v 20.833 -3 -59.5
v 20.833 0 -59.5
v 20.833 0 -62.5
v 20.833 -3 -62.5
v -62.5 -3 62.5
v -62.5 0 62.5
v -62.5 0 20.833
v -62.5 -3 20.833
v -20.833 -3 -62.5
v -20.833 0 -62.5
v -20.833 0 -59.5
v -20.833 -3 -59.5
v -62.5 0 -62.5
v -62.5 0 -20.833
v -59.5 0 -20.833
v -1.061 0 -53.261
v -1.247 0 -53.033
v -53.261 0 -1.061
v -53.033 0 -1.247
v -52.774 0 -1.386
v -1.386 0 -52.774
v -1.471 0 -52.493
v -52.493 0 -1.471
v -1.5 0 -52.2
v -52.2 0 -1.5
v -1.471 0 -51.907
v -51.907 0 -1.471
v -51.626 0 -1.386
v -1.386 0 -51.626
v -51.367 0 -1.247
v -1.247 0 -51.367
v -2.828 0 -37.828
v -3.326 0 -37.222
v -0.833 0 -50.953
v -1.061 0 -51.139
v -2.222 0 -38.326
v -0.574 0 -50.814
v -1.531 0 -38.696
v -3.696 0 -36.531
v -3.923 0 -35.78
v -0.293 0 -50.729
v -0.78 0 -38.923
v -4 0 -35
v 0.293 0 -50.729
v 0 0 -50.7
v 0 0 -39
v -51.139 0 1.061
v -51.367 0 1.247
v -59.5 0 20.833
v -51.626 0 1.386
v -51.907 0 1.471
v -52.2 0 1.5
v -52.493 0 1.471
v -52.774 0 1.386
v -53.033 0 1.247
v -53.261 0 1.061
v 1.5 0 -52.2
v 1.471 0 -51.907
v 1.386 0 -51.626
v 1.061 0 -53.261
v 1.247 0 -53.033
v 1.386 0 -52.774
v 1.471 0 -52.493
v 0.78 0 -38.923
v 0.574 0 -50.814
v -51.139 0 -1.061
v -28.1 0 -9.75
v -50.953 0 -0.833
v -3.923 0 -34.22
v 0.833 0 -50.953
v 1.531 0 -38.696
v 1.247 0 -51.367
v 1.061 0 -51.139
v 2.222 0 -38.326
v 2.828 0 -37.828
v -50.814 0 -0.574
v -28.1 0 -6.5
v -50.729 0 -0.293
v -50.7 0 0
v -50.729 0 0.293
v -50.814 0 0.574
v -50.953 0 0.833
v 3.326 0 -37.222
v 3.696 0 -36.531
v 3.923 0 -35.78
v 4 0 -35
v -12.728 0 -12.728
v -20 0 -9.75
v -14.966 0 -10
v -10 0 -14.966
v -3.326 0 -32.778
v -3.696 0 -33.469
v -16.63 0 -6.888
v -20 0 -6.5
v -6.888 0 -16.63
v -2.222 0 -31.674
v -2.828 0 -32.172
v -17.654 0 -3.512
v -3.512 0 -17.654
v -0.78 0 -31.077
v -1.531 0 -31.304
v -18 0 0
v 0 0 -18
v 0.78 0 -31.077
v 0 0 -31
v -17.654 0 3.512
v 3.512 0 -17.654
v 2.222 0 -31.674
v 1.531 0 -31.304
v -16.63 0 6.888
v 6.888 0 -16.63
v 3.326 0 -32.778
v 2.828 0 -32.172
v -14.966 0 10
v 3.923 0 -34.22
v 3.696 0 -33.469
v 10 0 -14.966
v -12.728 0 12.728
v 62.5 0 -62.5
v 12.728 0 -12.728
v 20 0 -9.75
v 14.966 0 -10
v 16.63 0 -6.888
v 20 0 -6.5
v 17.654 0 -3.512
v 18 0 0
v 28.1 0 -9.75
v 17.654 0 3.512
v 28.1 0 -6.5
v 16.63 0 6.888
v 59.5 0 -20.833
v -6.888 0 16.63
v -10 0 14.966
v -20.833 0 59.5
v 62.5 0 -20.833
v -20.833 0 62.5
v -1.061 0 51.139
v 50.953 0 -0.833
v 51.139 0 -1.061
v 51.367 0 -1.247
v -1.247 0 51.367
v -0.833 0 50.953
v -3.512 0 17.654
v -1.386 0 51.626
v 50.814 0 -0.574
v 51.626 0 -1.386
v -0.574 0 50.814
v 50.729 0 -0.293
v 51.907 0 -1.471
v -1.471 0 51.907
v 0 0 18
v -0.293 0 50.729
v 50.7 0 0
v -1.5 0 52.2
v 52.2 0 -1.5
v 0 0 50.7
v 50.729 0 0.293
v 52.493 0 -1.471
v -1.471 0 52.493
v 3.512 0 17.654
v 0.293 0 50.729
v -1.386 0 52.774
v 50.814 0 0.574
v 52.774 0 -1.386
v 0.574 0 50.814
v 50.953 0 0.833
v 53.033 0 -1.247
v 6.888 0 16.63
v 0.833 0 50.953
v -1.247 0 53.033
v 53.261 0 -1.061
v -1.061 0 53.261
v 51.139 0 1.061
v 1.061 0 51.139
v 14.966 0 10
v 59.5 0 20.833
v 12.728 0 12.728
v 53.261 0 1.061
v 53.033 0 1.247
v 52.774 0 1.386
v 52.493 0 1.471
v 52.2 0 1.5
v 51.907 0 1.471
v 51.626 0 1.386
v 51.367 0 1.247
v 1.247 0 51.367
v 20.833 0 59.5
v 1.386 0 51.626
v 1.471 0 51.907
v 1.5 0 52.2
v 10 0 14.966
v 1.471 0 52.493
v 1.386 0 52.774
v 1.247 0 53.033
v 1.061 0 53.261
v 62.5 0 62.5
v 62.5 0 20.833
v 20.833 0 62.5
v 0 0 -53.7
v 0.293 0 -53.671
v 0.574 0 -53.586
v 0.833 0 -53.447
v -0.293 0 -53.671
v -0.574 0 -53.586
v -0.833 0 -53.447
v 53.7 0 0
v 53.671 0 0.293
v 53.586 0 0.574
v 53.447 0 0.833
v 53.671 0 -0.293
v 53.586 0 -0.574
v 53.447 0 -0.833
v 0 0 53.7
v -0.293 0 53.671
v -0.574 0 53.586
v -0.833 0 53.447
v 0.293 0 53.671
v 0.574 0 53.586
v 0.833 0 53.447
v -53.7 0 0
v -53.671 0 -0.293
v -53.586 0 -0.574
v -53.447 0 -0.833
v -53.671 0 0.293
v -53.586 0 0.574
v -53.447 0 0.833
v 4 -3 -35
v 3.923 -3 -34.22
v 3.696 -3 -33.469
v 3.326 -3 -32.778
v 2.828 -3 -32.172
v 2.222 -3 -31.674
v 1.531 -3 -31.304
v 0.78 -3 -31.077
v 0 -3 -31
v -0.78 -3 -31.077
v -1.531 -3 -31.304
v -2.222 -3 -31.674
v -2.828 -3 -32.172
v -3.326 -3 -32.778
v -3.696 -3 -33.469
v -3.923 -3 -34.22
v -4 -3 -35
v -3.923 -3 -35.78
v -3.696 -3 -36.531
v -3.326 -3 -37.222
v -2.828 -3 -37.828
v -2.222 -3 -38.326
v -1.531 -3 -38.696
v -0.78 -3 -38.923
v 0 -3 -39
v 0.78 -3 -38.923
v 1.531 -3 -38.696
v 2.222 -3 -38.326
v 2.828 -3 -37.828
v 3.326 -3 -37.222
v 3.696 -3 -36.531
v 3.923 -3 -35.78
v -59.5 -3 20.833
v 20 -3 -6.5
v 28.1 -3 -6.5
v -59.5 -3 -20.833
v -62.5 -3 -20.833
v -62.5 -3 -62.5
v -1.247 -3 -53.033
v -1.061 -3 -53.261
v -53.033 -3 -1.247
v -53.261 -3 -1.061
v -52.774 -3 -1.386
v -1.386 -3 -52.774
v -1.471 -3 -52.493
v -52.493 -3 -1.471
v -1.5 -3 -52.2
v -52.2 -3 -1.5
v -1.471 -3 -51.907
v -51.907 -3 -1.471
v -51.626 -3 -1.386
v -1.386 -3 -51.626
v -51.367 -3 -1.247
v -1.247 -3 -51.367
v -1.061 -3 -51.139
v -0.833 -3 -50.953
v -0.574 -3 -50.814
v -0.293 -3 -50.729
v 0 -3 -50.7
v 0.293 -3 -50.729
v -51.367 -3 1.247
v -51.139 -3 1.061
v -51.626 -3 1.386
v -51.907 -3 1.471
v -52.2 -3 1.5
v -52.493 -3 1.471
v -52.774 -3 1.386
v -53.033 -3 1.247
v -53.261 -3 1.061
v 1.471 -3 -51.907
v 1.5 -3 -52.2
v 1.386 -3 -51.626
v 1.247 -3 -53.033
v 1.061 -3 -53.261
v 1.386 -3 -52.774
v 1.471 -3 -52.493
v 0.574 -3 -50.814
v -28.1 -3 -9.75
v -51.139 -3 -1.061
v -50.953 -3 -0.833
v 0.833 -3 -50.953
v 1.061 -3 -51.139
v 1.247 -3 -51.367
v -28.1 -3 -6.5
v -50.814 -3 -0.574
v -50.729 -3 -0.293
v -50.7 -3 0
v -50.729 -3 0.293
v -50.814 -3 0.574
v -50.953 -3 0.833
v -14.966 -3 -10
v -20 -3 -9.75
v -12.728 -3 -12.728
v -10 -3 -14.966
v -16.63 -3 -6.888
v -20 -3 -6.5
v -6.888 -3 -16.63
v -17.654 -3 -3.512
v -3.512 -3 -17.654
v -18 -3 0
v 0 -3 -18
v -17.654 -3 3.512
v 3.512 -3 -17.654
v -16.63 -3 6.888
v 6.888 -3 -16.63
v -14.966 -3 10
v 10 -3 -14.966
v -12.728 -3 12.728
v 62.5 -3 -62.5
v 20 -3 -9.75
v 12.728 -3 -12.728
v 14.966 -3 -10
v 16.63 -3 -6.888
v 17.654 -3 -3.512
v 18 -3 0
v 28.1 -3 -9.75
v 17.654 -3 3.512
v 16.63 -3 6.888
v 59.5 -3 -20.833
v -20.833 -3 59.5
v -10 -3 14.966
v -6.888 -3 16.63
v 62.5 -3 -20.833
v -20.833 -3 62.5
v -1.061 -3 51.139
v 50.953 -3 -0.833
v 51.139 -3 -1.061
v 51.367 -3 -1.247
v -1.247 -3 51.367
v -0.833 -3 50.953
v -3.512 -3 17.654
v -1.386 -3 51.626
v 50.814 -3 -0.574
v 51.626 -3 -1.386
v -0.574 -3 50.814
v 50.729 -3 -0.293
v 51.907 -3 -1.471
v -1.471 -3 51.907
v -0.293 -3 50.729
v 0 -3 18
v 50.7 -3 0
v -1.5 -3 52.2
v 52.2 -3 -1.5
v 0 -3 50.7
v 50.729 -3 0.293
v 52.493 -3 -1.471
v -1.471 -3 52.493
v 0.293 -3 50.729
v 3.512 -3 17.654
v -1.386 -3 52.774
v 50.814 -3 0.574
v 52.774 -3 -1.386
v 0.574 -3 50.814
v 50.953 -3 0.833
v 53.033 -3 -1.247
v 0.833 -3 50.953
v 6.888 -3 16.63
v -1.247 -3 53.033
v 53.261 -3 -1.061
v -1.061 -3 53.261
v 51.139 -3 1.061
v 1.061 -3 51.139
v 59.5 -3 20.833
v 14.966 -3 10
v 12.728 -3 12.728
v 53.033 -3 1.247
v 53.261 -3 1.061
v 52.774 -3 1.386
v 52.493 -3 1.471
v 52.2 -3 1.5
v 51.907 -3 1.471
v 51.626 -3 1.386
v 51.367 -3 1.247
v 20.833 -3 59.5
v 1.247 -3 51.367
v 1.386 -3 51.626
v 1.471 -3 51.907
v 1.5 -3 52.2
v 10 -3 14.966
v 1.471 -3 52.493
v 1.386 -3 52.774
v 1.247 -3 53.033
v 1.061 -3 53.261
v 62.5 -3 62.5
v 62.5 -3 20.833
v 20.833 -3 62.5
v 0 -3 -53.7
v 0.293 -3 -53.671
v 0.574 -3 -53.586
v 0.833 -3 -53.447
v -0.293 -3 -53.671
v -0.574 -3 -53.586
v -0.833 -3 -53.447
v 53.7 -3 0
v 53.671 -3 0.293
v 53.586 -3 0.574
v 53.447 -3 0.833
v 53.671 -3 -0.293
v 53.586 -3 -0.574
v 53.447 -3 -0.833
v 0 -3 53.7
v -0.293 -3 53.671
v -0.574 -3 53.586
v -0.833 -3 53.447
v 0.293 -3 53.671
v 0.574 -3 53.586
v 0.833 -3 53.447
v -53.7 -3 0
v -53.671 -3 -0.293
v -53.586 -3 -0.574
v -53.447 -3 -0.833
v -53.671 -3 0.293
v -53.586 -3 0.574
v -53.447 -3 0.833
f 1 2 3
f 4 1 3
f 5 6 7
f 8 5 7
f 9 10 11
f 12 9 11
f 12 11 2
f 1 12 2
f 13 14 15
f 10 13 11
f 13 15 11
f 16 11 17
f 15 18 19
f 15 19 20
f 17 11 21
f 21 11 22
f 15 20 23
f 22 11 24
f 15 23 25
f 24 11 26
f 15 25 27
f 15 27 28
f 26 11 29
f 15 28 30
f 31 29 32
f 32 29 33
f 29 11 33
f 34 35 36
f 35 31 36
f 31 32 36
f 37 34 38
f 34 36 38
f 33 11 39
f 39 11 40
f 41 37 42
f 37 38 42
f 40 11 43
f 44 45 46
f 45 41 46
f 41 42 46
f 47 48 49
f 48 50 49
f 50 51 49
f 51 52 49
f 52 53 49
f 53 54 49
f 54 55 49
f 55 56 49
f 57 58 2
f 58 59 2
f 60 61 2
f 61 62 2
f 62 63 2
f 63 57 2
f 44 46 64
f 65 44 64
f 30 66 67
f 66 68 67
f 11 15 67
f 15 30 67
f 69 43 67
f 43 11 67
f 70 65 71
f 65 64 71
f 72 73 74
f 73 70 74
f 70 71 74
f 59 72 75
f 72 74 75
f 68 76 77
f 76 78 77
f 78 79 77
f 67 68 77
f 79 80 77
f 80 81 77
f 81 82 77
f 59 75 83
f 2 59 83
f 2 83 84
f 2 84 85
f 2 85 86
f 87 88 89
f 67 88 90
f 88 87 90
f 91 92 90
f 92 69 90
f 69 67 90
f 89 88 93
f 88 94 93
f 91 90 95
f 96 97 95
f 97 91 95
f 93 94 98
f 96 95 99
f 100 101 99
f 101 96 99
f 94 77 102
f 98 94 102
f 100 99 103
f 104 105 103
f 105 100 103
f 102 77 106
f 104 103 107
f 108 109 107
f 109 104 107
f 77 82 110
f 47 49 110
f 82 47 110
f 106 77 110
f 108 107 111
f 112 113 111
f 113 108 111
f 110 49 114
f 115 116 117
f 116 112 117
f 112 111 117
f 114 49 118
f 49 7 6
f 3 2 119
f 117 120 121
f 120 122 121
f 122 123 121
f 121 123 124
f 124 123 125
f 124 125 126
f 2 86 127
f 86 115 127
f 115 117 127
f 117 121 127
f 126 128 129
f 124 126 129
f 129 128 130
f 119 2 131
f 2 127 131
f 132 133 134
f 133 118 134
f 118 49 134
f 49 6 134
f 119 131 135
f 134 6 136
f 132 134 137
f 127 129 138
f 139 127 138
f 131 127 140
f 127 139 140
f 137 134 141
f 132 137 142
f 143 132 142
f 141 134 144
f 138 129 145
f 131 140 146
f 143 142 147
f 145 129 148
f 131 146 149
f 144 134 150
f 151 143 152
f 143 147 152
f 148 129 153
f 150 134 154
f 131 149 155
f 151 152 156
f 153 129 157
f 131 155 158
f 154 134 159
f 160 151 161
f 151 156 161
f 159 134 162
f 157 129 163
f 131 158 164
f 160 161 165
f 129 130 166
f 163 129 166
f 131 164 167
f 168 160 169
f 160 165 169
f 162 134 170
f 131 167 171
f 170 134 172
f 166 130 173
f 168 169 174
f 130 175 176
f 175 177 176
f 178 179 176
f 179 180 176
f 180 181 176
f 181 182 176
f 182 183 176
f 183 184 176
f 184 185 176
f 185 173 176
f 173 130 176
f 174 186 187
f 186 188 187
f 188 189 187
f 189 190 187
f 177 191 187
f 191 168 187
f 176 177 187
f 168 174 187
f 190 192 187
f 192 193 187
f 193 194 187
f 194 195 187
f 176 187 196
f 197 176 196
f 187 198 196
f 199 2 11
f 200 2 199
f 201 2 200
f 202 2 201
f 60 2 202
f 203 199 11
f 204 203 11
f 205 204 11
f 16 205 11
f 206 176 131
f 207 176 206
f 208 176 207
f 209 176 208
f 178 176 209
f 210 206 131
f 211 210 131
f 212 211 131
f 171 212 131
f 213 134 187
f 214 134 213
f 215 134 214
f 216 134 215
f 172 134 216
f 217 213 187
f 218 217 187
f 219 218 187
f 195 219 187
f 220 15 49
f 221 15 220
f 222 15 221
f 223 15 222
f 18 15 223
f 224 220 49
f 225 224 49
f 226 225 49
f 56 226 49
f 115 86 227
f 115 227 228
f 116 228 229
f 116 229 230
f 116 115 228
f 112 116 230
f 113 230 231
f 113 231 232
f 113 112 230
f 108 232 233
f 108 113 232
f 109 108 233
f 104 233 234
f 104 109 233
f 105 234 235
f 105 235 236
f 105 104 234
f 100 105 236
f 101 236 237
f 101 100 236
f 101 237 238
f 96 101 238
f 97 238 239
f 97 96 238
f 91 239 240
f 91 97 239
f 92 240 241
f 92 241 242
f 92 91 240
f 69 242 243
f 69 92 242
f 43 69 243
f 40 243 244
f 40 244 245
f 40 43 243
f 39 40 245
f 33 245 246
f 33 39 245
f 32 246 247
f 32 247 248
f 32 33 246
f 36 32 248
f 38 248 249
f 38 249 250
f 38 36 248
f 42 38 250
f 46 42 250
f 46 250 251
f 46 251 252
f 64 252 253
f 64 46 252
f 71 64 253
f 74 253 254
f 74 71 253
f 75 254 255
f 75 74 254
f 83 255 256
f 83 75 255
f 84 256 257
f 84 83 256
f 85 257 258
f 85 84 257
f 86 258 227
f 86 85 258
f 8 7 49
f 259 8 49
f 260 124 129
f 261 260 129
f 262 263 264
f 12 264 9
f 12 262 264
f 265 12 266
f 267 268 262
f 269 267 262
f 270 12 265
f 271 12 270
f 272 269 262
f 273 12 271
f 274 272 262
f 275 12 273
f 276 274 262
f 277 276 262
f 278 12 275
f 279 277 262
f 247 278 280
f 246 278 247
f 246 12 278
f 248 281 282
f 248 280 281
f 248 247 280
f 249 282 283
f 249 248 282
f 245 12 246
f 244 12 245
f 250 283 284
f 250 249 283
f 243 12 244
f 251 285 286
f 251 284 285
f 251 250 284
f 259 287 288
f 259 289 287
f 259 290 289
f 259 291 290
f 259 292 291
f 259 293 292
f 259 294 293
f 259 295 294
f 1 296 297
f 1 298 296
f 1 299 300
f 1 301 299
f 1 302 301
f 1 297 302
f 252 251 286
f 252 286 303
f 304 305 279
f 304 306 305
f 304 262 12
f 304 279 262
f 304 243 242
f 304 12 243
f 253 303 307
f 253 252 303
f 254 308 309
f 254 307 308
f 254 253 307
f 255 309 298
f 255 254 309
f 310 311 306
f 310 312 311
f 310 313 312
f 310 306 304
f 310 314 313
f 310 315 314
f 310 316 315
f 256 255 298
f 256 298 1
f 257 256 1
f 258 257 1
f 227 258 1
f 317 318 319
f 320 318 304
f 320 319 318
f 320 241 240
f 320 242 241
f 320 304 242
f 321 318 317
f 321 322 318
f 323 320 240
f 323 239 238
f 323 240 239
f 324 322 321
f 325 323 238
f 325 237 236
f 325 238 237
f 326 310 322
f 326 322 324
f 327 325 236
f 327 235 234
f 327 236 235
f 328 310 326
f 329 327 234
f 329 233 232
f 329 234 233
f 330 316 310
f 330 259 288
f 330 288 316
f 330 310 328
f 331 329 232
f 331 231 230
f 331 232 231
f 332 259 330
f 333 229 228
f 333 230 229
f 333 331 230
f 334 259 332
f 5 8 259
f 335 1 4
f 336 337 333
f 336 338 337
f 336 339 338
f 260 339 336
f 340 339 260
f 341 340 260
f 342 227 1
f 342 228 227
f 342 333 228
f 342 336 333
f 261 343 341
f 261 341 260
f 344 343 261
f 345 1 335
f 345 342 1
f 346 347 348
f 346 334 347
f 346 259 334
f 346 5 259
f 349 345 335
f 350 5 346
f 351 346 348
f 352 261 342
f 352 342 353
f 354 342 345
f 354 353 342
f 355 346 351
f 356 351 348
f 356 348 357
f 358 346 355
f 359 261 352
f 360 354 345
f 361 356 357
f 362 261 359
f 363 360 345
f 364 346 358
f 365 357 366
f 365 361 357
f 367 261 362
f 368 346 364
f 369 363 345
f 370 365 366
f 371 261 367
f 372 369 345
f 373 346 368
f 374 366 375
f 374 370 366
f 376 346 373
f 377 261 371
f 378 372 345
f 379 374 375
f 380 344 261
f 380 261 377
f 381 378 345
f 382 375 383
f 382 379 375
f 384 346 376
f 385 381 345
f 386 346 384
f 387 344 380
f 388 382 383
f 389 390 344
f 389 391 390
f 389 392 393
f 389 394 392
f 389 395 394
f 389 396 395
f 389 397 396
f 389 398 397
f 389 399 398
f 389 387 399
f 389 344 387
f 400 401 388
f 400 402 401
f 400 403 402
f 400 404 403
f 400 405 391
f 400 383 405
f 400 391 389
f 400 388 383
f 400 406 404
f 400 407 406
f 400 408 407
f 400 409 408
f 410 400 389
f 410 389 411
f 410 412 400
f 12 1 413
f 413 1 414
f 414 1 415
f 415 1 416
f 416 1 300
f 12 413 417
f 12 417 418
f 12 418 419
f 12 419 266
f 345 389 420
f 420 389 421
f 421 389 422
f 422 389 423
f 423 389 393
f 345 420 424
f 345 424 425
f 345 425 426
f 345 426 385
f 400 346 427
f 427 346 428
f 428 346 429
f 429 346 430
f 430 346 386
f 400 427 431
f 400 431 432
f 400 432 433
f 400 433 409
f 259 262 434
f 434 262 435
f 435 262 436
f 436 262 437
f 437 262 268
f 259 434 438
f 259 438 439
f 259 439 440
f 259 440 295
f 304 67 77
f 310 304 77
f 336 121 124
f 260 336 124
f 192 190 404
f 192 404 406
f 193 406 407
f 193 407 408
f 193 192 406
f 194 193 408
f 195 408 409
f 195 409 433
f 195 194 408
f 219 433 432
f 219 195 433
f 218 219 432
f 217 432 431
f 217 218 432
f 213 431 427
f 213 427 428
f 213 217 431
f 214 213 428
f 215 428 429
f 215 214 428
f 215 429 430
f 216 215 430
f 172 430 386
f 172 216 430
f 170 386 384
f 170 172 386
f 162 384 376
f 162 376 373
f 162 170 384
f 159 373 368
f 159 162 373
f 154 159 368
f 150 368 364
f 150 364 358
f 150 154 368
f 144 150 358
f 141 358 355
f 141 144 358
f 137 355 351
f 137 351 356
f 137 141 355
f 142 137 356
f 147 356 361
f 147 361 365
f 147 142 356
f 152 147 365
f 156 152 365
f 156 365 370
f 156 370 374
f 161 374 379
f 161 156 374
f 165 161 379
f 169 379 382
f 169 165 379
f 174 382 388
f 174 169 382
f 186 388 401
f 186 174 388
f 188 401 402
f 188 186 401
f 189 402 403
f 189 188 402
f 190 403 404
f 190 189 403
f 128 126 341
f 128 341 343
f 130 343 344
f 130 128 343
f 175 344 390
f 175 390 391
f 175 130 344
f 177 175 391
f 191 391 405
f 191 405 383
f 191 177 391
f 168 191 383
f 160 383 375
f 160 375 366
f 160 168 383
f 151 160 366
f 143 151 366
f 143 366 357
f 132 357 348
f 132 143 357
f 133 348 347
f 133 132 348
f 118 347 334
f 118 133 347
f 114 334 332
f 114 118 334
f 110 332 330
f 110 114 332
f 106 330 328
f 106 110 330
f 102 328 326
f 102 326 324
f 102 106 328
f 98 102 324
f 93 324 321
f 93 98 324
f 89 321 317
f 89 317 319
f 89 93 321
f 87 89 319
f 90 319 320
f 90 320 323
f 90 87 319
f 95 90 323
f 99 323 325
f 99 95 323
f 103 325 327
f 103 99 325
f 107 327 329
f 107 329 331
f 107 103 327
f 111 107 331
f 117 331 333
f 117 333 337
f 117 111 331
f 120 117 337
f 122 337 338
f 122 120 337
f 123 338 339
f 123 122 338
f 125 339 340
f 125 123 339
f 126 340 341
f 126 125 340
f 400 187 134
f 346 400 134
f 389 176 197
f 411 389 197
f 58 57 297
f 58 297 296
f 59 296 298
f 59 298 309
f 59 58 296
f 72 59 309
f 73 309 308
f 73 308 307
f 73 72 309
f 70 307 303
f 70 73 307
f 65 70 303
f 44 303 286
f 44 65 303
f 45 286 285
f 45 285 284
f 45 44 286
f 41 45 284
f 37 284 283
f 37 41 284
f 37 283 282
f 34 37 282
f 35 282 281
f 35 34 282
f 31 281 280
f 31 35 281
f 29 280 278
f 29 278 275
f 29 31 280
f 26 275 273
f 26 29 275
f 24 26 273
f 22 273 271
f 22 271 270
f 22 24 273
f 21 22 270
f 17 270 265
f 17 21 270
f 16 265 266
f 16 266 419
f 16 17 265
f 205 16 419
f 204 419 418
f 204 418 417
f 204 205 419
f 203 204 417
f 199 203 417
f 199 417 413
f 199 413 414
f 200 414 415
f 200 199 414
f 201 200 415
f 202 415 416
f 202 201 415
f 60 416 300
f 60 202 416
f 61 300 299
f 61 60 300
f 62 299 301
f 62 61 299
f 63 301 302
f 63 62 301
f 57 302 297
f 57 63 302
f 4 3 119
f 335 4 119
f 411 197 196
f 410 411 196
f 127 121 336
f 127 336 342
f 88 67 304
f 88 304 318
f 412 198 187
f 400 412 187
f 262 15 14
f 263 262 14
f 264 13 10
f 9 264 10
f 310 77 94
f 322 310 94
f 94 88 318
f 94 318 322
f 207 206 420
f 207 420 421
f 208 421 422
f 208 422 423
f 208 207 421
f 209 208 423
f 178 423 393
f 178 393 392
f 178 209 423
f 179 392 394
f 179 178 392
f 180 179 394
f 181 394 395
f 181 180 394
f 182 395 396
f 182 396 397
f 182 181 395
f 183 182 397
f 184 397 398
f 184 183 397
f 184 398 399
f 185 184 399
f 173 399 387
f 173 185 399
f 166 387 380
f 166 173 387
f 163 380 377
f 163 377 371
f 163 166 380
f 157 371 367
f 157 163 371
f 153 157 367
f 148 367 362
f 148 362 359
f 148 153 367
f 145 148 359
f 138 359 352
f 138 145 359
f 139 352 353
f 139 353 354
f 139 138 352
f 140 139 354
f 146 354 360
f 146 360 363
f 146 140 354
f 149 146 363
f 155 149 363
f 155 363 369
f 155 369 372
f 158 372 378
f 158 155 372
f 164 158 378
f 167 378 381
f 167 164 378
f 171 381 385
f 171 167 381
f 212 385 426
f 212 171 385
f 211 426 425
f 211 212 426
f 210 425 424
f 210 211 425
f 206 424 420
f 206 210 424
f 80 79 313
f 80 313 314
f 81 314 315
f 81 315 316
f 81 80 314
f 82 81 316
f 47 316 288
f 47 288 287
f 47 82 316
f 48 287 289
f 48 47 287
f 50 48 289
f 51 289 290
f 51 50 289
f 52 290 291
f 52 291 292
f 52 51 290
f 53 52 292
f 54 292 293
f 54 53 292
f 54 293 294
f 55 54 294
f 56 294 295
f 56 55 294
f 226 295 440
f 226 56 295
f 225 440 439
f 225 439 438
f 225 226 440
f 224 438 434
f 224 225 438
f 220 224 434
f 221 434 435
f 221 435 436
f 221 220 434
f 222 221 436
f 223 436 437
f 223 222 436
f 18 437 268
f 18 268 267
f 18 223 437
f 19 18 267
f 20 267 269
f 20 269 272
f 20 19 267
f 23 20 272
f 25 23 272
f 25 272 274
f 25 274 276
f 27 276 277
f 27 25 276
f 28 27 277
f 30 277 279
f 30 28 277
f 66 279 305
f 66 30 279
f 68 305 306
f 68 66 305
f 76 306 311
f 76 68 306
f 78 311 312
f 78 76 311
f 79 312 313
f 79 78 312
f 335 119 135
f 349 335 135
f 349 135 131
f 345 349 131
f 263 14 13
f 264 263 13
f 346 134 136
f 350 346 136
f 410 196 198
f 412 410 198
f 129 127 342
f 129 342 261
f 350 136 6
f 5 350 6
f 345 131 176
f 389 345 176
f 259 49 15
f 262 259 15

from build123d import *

# Parameters (mm, degrees)
F0_W     = 8.1
F0_H     = 3.25
F0_R     = 1.5
F0_R_2   = 4
F0_R_3   = 18
F1_DEPTH = 3


with BuildPart() as f1:
    # F0 (on Front) → F1 (new body)
    with BuildSketch(Plane.XZ):
        Polygon((-62.5, -20.833333), (-62.5, -62.5), (-20.833333, -62.5), (-20.833333, -59.5), (20.833333, -59.5), (20.833333, -62.5), (62.5, -62.5), (62.5, -20.833333), (59.5, -20.833333), (59.5, 20.833333), (62.5, 20.833333), (62.5, 62.5), (20.833333, 62.5), (20.833333, 59.5), (-20.833333, 59.5), (-20.833333, 62.5), (-62.5, 62.5), (-62.5, 20.833333), (-59.5, 20.833333), (-59.5, -20.833333), align=None)
        with Locations((-24.05, -8.125)):
            Rectangle(F0_W, F0_H, mode=Mode.SUBTRACT)
        with Locations((0, -52.2)):
            Circle(F0_R, mode=Mode.SUBTRACT)
        with Locations((0, -35)):
            Circle(F0_R_2, mode=Mode.SUBTRACT)
        with Locations((24.05, -8.125)):
            Rectangle(F0_W, F0_H, mode=Mode.SUBTRACT)
        with Locations((-52.2, 0)):
            Circle(F0_R, mode=Mode.SUBTRACT)
        Circle(F0_R_3, mode=Mode.SUBTRACT)
        with Locations((52.2, 0)):
            Circle(F0_R, mode=Mode.SUBTRACT)
        with Locations((0, 52.2)):
            Circle(F0_R, mode=Mode.SUBTRACT)
    extrude(amount=F1_DEPTH)


with BuildPart() as f2_1:
    # F2: copy of F1
    add(f1.part.moved(Location((0, 60, 0))))


solid = f1.part
